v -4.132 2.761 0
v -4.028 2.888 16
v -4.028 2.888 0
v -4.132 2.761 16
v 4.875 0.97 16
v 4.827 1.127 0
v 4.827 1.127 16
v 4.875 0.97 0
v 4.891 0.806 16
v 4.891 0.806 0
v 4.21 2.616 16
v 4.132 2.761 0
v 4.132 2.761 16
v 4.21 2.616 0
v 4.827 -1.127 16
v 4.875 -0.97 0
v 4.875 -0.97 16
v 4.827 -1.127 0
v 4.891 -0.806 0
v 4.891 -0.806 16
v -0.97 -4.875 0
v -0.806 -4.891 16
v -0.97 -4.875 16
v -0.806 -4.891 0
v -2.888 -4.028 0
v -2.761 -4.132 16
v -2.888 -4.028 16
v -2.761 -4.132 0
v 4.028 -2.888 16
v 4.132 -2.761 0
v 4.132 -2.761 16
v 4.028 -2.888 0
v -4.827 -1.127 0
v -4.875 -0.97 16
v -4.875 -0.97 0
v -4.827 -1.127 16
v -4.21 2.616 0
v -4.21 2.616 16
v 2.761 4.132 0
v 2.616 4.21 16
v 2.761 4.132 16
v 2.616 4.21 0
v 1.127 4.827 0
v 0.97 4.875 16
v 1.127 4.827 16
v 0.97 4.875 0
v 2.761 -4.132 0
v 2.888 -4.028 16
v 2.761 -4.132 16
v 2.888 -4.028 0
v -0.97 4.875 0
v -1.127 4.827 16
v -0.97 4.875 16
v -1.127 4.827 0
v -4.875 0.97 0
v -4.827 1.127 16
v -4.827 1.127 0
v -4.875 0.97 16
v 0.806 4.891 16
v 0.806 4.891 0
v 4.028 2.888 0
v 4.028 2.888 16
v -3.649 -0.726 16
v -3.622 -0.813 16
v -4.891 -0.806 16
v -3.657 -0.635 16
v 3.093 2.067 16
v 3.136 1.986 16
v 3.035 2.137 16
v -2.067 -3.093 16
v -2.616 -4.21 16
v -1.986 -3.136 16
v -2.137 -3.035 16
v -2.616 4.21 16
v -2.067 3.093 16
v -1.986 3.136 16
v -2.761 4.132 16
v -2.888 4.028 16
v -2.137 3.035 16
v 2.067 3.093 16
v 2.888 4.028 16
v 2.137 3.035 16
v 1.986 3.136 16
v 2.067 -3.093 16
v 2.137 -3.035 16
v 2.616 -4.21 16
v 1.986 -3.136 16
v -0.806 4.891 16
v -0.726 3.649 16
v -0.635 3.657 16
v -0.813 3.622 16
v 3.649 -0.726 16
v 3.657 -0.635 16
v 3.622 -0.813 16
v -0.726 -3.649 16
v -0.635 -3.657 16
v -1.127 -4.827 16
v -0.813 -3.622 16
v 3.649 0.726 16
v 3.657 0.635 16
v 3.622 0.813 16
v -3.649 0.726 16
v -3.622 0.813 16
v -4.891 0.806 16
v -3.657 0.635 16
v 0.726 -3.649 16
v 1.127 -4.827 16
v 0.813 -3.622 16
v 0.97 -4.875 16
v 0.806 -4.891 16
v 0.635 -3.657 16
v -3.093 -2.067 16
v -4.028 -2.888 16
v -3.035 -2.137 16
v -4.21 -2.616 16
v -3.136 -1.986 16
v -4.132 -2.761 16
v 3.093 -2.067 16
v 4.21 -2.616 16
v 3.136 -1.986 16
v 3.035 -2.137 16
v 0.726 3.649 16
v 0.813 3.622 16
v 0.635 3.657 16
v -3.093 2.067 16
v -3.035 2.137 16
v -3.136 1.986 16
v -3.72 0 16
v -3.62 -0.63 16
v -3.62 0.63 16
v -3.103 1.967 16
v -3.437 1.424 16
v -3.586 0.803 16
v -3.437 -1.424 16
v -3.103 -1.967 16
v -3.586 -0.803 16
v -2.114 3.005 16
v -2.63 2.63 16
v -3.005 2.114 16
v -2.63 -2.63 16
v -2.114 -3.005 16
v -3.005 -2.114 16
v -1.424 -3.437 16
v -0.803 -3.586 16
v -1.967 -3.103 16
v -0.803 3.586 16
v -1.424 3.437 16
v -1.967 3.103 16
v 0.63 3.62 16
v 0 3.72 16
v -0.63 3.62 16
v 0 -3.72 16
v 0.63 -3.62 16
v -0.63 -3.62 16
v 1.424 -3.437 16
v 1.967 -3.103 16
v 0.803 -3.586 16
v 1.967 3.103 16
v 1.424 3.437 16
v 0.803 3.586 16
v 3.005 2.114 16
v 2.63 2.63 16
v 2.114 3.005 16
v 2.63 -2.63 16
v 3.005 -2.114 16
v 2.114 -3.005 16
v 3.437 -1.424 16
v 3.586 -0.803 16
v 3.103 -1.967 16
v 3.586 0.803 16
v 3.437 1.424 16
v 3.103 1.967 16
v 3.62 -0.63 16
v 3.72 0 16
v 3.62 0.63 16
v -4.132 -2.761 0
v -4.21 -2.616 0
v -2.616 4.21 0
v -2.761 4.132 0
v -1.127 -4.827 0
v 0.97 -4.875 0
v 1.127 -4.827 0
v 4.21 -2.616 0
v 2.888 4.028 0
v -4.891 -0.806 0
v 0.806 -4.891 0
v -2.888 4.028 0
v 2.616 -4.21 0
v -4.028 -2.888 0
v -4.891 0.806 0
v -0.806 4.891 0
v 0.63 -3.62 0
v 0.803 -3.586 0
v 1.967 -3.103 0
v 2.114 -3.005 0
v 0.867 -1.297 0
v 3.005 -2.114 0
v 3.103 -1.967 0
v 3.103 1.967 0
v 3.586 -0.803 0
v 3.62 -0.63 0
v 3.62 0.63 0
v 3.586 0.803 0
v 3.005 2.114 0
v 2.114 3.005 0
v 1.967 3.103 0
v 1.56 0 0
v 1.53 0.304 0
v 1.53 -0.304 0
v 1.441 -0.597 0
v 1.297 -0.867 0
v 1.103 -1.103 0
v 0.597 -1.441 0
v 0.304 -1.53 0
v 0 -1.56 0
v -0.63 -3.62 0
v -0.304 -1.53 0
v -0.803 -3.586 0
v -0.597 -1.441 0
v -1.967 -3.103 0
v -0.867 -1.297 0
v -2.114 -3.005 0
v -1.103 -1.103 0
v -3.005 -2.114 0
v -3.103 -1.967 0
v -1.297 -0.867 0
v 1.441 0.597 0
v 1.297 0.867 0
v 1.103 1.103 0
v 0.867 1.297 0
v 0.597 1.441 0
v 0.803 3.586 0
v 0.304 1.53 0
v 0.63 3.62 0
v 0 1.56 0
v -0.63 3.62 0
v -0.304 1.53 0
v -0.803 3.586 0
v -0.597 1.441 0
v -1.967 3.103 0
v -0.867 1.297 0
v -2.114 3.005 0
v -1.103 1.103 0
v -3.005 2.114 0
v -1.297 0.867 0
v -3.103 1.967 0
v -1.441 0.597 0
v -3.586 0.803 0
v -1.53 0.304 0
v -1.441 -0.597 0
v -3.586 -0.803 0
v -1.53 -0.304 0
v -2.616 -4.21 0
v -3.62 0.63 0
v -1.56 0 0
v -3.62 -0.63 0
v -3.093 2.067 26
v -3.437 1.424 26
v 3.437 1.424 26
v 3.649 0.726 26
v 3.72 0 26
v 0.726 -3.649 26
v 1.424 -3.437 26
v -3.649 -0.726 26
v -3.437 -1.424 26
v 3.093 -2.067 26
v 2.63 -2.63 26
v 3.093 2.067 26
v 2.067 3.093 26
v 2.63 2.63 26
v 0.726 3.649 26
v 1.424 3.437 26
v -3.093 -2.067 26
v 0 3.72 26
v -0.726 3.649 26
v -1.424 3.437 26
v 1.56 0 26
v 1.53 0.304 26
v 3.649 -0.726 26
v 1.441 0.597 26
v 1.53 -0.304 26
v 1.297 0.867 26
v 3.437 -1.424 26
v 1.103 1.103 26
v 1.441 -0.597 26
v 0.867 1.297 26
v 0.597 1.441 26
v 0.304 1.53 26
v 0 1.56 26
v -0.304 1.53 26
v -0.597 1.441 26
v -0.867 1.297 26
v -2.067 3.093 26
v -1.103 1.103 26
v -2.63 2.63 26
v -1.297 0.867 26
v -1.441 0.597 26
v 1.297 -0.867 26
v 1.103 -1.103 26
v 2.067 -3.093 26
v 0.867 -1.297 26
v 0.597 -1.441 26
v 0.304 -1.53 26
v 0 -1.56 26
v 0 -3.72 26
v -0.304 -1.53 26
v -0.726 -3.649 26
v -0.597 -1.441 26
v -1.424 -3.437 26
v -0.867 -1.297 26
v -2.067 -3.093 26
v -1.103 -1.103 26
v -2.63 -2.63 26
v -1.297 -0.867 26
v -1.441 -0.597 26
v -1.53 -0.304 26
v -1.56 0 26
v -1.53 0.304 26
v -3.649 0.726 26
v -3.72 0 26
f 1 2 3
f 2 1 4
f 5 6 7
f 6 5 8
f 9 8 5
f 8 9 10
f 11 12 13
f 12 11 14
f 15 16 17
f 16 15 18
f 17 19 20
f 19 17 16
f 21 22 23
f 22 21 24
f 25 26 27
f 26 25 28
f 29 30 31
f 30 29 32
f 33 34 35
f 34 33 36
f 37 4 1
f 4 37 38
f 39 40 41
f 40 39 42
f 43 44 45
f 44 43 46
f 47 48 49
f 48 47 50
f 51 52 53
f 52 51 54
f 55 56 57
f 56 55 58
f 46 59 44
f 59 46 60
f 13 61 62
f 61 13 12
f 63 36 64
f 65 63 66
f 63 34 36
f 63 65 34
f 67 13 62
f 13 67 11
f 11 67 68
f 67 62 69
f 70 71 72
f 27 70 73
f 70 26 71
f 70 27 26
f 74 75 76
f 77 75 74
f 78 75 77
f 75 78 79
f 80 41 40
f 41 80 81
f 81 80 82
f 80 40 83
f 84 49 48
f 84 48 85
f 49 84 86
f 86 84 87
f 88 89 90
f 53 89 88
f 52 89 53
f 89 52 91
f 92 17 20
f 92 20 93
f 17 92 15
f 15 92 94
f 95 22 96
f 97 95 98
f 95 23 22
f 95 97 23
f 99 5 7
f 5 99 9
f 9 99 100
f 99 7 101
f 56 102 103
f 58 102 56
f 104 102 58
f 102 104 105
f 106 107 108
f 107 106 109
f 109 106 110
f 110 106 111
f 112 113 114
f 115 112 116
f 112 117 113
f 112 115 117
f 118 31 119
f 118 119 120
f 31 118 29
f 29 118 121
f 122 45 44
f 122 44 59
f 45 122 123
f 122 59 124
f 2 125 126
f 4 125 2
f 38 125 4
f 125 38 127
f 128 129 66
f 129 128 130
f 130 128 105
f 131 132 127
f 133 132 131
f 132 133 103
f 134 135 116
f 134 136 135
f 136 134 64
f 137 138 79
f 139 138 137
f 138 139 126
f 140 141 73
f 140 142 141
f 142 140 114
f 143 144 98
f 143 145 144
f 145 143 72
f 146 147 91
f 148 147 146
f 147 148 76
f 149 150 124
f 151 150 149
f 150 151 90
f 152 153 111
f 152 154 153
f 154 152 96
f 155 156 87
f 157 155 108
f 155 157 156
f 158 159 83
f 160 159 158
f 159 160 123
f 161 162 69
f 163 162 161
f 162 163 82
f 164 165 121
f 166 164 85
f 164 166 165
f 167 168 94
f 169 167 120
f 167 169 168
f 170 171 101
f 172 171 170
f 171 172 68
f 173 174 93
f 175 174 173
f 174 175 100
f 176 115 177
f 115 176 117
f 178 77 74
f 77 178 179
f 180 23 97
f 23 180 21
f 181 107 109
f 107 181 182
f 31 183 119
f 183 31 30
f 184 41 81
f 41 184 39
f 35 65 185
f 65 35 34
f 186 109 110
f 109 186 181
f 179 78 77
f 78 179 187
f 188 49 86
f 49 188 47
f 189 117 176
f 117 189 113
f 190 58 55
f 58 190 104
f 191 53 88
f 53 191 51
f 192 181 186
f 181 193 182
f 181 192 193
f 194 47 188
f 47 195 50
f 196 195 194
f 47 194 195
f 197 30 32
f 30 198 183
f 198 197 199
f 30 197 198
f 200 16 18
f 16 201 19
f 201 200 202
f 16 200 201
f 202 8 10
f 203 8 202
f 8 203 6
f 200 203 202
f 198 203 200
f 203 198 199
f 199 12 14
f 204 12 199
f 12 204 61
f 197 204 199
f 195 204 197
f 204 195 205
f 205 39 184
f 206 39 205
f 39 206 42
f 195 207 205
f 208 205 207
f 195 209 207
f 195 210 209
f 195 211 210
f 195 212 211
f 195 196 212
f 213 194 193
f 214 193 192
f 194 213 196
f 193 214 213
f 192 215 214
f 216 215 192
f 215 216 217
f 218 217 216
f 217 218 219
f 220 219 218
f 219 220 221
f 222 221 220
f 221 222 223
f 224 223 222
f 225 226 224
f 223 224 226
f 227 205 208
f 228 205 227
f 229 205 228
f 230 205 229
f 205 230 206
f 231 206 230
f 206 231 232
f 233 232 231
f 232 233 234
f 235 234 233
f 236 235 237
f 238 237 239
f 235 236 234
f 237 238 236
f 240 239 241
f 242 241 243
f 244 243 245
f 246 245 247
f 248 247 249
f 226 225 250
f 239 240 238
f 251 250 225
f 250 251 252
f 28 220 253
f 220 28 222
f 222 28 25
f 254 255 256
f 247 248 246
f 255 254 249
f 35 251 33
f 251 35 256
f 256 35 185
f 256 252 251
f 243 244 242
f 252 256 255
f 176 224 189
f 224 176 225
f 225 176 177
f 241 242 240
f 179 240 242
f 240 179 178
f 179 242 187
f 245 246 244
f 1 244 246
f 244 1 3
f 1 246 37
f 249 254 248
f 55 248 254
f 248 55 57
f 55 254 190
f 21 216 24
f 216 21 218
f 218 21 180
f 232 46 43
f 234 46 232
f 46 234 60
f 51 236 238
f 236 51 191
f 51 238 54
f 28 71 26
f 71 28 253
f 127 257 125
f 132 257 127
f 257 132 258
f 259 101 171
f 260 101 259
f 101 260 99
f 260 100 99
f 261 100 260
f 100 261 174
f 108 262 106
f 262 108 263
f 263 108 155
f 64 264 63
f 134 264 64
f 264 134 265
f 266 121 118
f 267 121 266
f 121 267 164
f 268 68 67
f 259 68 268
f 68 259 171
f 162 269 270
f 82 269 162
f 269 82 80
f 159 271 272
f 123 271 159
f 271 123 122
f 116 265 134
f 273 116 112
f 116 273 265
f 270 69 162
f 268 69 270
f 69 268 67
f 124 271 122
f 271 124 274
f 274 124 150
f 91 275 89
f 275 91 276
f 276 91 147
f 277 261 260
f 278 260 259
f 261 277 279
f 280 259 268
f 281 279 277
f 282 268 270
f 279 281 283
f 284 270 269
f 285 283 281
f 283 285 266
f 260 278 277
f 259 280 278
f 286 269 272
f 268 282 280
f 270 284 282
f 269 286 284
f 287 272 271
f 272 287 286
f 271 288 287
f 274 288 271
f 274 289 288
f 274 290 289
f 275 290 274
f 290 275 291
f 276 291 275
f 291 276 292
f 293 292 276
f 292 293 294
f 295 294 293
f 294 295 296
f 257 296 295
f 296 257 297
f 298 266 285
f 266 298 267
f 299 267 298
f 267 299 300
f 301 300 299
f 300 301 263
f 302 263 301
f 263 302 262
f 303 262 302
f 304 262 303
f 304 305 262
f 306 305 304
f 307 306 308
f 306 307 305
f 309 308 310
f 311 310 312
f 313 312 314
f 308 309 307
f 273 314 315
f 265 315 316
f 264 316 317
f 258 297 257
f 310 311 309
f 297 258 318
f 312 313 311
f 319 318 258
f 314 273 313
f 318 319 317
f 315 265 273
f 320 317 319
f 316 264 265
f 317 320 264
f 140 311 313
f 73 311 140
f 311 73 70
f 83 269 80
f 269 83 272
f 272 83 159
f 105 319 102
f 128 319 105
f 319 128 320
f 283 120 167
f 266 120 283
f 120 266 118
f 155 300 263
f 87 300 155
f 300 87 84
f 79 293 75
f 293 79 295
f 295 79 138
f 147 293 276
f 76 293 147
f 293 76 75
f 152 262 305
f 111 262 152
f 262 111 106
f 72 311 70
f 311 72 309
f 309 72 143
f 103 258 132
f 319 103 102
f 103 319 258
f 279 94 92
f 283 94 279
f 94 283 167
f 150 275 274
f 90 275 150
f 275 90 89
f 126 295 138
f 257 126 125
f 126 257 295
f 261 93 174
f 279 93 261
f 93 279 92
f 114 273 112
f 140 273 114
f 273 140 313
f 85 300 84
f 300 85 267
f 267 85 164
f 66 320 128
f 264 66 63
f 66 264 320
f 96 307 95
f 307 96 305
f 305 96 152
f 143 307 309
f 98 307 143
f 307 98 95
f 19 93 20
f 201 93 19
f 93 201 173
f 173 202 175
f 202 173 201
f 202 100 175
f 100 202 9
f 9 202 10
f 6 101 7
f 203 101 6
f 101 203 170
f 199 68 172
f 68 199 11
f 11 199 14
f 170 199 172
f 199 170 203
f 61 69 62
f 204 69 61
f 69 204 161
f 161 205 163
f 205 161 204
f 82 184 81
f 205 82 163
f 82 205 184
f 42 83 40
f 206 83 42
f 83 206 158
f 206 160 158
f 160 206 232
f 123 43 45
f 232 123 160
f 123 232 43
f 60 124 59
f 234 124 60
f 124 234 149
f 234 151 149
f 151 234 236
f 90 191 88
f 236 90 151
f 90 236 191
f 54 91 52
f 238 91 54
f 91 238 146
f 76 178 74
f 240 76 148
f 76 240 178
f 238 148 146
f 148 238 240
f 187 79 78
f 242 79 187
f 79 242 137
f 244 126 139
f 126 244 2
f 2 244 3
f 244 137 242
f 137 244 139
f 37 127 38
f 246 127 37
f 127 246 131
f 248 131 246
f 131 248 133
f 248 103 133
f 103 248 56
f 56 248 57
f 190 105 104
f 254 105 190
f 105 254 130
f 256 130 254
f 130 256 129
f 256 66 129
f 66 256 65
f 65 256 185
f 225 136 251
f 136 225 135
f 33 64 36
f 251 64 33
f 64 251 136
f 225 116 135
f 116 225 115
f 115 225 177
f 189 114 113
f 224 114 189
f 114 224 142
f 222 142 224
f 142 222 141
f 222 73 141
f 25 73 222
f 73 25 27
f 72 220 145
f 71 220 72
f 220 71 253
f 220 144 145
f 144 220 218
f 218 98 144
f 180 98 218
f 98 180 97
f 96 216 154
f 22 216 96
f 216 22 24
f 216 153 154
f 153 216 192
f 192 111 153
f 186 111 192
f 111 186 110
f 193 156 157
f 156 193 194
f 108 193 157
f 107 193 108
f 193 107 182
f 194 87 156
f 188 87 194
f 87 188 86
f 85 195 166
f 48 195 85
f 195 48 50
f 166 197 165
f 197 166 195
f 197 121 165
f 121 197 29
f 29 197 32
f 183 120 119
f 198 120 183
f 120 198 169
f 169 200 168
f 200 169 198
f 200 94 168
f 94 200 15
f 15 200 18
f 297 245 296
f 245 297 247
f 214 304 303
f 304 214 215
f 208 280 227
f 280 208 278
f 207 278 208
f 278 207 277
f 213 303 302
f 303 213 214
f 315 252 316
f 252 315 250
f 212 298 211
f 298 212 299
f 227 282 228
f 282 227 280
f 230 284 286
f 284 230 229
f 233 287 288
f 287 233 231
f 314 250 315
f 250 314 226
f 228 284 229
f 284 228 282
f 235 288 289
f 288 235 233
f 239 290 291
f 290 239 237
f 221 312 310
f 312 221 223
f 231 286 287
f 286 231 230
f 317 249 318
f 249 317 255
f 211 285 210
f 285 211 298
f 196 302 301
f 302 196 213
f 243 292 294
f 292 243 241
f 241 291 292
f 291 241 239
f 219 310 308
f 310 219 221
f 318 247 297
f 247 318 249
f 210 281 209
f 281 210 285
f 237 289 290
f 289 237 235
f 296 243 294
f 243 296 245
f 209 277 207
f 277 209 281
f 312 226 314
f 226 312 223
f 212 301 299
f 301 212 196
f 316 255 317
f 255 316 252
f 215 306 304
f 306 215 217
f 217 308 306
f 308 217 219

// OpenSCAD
$fn = 32;

// ----------------------------------------------------------------------
// Timing pulley: GT2 16T, pitch 2 mm, 9.94 mm x 26 mm
// ----------------------------------------------------------------------

// --- parameters (mm) ---
pitch_mm = 2;             // belt pitch
tooth_count = 16;         // number of grooves
width = 16;               // belt width between the flanges
tip_d = 9.94;             // tip circle diameter
root_d = 8.44;            // groove bottom diameter
groove_h = 0.75;          // groove depth
tooth_w = 1.5;            // groove width at the tip circle
hub_bore = 3.12;          // shaft bore
hub_d = 7.44;             // hub diameter
hub_h = 10;               // hub above the flange
bottom_z = 0;             // lowest point of the pulley
top_z = 26;               // highest point of the pulley

module rim() {
  cylinder(h = width, d = tip_d);
}

module groove_cutter() {
  /* belt tooth groove: deeper than wide, cut through the belt width */
  translate([root_d / 2, 0, 0])
    linear_extrude(height = width)
      polygon(points = [[-0.6, -tooth_w * 0.42], [groove_h + 0.6, -tooth_w * 0.6],
                        [groove_h + 0.6, tooth_w * 0.6], [-0.6, tooth_w * 0.42]]);
}

module hub() {
  translate([0, 0, bottom_z]) cylinder(h = top_z - bottom_z, d = hub_d);
}

difference() {
  union() {
    rim();
    hub();
  }
  for (i = [0 : tooth_count - 1]) rotate([0, 0, i * 360 / tooth_count]) groove_cutter();
  translate([0, 0, bottom_z - 1]) cylinder(h = top_z - bottom_z + 2, d = hub_bore);
}
